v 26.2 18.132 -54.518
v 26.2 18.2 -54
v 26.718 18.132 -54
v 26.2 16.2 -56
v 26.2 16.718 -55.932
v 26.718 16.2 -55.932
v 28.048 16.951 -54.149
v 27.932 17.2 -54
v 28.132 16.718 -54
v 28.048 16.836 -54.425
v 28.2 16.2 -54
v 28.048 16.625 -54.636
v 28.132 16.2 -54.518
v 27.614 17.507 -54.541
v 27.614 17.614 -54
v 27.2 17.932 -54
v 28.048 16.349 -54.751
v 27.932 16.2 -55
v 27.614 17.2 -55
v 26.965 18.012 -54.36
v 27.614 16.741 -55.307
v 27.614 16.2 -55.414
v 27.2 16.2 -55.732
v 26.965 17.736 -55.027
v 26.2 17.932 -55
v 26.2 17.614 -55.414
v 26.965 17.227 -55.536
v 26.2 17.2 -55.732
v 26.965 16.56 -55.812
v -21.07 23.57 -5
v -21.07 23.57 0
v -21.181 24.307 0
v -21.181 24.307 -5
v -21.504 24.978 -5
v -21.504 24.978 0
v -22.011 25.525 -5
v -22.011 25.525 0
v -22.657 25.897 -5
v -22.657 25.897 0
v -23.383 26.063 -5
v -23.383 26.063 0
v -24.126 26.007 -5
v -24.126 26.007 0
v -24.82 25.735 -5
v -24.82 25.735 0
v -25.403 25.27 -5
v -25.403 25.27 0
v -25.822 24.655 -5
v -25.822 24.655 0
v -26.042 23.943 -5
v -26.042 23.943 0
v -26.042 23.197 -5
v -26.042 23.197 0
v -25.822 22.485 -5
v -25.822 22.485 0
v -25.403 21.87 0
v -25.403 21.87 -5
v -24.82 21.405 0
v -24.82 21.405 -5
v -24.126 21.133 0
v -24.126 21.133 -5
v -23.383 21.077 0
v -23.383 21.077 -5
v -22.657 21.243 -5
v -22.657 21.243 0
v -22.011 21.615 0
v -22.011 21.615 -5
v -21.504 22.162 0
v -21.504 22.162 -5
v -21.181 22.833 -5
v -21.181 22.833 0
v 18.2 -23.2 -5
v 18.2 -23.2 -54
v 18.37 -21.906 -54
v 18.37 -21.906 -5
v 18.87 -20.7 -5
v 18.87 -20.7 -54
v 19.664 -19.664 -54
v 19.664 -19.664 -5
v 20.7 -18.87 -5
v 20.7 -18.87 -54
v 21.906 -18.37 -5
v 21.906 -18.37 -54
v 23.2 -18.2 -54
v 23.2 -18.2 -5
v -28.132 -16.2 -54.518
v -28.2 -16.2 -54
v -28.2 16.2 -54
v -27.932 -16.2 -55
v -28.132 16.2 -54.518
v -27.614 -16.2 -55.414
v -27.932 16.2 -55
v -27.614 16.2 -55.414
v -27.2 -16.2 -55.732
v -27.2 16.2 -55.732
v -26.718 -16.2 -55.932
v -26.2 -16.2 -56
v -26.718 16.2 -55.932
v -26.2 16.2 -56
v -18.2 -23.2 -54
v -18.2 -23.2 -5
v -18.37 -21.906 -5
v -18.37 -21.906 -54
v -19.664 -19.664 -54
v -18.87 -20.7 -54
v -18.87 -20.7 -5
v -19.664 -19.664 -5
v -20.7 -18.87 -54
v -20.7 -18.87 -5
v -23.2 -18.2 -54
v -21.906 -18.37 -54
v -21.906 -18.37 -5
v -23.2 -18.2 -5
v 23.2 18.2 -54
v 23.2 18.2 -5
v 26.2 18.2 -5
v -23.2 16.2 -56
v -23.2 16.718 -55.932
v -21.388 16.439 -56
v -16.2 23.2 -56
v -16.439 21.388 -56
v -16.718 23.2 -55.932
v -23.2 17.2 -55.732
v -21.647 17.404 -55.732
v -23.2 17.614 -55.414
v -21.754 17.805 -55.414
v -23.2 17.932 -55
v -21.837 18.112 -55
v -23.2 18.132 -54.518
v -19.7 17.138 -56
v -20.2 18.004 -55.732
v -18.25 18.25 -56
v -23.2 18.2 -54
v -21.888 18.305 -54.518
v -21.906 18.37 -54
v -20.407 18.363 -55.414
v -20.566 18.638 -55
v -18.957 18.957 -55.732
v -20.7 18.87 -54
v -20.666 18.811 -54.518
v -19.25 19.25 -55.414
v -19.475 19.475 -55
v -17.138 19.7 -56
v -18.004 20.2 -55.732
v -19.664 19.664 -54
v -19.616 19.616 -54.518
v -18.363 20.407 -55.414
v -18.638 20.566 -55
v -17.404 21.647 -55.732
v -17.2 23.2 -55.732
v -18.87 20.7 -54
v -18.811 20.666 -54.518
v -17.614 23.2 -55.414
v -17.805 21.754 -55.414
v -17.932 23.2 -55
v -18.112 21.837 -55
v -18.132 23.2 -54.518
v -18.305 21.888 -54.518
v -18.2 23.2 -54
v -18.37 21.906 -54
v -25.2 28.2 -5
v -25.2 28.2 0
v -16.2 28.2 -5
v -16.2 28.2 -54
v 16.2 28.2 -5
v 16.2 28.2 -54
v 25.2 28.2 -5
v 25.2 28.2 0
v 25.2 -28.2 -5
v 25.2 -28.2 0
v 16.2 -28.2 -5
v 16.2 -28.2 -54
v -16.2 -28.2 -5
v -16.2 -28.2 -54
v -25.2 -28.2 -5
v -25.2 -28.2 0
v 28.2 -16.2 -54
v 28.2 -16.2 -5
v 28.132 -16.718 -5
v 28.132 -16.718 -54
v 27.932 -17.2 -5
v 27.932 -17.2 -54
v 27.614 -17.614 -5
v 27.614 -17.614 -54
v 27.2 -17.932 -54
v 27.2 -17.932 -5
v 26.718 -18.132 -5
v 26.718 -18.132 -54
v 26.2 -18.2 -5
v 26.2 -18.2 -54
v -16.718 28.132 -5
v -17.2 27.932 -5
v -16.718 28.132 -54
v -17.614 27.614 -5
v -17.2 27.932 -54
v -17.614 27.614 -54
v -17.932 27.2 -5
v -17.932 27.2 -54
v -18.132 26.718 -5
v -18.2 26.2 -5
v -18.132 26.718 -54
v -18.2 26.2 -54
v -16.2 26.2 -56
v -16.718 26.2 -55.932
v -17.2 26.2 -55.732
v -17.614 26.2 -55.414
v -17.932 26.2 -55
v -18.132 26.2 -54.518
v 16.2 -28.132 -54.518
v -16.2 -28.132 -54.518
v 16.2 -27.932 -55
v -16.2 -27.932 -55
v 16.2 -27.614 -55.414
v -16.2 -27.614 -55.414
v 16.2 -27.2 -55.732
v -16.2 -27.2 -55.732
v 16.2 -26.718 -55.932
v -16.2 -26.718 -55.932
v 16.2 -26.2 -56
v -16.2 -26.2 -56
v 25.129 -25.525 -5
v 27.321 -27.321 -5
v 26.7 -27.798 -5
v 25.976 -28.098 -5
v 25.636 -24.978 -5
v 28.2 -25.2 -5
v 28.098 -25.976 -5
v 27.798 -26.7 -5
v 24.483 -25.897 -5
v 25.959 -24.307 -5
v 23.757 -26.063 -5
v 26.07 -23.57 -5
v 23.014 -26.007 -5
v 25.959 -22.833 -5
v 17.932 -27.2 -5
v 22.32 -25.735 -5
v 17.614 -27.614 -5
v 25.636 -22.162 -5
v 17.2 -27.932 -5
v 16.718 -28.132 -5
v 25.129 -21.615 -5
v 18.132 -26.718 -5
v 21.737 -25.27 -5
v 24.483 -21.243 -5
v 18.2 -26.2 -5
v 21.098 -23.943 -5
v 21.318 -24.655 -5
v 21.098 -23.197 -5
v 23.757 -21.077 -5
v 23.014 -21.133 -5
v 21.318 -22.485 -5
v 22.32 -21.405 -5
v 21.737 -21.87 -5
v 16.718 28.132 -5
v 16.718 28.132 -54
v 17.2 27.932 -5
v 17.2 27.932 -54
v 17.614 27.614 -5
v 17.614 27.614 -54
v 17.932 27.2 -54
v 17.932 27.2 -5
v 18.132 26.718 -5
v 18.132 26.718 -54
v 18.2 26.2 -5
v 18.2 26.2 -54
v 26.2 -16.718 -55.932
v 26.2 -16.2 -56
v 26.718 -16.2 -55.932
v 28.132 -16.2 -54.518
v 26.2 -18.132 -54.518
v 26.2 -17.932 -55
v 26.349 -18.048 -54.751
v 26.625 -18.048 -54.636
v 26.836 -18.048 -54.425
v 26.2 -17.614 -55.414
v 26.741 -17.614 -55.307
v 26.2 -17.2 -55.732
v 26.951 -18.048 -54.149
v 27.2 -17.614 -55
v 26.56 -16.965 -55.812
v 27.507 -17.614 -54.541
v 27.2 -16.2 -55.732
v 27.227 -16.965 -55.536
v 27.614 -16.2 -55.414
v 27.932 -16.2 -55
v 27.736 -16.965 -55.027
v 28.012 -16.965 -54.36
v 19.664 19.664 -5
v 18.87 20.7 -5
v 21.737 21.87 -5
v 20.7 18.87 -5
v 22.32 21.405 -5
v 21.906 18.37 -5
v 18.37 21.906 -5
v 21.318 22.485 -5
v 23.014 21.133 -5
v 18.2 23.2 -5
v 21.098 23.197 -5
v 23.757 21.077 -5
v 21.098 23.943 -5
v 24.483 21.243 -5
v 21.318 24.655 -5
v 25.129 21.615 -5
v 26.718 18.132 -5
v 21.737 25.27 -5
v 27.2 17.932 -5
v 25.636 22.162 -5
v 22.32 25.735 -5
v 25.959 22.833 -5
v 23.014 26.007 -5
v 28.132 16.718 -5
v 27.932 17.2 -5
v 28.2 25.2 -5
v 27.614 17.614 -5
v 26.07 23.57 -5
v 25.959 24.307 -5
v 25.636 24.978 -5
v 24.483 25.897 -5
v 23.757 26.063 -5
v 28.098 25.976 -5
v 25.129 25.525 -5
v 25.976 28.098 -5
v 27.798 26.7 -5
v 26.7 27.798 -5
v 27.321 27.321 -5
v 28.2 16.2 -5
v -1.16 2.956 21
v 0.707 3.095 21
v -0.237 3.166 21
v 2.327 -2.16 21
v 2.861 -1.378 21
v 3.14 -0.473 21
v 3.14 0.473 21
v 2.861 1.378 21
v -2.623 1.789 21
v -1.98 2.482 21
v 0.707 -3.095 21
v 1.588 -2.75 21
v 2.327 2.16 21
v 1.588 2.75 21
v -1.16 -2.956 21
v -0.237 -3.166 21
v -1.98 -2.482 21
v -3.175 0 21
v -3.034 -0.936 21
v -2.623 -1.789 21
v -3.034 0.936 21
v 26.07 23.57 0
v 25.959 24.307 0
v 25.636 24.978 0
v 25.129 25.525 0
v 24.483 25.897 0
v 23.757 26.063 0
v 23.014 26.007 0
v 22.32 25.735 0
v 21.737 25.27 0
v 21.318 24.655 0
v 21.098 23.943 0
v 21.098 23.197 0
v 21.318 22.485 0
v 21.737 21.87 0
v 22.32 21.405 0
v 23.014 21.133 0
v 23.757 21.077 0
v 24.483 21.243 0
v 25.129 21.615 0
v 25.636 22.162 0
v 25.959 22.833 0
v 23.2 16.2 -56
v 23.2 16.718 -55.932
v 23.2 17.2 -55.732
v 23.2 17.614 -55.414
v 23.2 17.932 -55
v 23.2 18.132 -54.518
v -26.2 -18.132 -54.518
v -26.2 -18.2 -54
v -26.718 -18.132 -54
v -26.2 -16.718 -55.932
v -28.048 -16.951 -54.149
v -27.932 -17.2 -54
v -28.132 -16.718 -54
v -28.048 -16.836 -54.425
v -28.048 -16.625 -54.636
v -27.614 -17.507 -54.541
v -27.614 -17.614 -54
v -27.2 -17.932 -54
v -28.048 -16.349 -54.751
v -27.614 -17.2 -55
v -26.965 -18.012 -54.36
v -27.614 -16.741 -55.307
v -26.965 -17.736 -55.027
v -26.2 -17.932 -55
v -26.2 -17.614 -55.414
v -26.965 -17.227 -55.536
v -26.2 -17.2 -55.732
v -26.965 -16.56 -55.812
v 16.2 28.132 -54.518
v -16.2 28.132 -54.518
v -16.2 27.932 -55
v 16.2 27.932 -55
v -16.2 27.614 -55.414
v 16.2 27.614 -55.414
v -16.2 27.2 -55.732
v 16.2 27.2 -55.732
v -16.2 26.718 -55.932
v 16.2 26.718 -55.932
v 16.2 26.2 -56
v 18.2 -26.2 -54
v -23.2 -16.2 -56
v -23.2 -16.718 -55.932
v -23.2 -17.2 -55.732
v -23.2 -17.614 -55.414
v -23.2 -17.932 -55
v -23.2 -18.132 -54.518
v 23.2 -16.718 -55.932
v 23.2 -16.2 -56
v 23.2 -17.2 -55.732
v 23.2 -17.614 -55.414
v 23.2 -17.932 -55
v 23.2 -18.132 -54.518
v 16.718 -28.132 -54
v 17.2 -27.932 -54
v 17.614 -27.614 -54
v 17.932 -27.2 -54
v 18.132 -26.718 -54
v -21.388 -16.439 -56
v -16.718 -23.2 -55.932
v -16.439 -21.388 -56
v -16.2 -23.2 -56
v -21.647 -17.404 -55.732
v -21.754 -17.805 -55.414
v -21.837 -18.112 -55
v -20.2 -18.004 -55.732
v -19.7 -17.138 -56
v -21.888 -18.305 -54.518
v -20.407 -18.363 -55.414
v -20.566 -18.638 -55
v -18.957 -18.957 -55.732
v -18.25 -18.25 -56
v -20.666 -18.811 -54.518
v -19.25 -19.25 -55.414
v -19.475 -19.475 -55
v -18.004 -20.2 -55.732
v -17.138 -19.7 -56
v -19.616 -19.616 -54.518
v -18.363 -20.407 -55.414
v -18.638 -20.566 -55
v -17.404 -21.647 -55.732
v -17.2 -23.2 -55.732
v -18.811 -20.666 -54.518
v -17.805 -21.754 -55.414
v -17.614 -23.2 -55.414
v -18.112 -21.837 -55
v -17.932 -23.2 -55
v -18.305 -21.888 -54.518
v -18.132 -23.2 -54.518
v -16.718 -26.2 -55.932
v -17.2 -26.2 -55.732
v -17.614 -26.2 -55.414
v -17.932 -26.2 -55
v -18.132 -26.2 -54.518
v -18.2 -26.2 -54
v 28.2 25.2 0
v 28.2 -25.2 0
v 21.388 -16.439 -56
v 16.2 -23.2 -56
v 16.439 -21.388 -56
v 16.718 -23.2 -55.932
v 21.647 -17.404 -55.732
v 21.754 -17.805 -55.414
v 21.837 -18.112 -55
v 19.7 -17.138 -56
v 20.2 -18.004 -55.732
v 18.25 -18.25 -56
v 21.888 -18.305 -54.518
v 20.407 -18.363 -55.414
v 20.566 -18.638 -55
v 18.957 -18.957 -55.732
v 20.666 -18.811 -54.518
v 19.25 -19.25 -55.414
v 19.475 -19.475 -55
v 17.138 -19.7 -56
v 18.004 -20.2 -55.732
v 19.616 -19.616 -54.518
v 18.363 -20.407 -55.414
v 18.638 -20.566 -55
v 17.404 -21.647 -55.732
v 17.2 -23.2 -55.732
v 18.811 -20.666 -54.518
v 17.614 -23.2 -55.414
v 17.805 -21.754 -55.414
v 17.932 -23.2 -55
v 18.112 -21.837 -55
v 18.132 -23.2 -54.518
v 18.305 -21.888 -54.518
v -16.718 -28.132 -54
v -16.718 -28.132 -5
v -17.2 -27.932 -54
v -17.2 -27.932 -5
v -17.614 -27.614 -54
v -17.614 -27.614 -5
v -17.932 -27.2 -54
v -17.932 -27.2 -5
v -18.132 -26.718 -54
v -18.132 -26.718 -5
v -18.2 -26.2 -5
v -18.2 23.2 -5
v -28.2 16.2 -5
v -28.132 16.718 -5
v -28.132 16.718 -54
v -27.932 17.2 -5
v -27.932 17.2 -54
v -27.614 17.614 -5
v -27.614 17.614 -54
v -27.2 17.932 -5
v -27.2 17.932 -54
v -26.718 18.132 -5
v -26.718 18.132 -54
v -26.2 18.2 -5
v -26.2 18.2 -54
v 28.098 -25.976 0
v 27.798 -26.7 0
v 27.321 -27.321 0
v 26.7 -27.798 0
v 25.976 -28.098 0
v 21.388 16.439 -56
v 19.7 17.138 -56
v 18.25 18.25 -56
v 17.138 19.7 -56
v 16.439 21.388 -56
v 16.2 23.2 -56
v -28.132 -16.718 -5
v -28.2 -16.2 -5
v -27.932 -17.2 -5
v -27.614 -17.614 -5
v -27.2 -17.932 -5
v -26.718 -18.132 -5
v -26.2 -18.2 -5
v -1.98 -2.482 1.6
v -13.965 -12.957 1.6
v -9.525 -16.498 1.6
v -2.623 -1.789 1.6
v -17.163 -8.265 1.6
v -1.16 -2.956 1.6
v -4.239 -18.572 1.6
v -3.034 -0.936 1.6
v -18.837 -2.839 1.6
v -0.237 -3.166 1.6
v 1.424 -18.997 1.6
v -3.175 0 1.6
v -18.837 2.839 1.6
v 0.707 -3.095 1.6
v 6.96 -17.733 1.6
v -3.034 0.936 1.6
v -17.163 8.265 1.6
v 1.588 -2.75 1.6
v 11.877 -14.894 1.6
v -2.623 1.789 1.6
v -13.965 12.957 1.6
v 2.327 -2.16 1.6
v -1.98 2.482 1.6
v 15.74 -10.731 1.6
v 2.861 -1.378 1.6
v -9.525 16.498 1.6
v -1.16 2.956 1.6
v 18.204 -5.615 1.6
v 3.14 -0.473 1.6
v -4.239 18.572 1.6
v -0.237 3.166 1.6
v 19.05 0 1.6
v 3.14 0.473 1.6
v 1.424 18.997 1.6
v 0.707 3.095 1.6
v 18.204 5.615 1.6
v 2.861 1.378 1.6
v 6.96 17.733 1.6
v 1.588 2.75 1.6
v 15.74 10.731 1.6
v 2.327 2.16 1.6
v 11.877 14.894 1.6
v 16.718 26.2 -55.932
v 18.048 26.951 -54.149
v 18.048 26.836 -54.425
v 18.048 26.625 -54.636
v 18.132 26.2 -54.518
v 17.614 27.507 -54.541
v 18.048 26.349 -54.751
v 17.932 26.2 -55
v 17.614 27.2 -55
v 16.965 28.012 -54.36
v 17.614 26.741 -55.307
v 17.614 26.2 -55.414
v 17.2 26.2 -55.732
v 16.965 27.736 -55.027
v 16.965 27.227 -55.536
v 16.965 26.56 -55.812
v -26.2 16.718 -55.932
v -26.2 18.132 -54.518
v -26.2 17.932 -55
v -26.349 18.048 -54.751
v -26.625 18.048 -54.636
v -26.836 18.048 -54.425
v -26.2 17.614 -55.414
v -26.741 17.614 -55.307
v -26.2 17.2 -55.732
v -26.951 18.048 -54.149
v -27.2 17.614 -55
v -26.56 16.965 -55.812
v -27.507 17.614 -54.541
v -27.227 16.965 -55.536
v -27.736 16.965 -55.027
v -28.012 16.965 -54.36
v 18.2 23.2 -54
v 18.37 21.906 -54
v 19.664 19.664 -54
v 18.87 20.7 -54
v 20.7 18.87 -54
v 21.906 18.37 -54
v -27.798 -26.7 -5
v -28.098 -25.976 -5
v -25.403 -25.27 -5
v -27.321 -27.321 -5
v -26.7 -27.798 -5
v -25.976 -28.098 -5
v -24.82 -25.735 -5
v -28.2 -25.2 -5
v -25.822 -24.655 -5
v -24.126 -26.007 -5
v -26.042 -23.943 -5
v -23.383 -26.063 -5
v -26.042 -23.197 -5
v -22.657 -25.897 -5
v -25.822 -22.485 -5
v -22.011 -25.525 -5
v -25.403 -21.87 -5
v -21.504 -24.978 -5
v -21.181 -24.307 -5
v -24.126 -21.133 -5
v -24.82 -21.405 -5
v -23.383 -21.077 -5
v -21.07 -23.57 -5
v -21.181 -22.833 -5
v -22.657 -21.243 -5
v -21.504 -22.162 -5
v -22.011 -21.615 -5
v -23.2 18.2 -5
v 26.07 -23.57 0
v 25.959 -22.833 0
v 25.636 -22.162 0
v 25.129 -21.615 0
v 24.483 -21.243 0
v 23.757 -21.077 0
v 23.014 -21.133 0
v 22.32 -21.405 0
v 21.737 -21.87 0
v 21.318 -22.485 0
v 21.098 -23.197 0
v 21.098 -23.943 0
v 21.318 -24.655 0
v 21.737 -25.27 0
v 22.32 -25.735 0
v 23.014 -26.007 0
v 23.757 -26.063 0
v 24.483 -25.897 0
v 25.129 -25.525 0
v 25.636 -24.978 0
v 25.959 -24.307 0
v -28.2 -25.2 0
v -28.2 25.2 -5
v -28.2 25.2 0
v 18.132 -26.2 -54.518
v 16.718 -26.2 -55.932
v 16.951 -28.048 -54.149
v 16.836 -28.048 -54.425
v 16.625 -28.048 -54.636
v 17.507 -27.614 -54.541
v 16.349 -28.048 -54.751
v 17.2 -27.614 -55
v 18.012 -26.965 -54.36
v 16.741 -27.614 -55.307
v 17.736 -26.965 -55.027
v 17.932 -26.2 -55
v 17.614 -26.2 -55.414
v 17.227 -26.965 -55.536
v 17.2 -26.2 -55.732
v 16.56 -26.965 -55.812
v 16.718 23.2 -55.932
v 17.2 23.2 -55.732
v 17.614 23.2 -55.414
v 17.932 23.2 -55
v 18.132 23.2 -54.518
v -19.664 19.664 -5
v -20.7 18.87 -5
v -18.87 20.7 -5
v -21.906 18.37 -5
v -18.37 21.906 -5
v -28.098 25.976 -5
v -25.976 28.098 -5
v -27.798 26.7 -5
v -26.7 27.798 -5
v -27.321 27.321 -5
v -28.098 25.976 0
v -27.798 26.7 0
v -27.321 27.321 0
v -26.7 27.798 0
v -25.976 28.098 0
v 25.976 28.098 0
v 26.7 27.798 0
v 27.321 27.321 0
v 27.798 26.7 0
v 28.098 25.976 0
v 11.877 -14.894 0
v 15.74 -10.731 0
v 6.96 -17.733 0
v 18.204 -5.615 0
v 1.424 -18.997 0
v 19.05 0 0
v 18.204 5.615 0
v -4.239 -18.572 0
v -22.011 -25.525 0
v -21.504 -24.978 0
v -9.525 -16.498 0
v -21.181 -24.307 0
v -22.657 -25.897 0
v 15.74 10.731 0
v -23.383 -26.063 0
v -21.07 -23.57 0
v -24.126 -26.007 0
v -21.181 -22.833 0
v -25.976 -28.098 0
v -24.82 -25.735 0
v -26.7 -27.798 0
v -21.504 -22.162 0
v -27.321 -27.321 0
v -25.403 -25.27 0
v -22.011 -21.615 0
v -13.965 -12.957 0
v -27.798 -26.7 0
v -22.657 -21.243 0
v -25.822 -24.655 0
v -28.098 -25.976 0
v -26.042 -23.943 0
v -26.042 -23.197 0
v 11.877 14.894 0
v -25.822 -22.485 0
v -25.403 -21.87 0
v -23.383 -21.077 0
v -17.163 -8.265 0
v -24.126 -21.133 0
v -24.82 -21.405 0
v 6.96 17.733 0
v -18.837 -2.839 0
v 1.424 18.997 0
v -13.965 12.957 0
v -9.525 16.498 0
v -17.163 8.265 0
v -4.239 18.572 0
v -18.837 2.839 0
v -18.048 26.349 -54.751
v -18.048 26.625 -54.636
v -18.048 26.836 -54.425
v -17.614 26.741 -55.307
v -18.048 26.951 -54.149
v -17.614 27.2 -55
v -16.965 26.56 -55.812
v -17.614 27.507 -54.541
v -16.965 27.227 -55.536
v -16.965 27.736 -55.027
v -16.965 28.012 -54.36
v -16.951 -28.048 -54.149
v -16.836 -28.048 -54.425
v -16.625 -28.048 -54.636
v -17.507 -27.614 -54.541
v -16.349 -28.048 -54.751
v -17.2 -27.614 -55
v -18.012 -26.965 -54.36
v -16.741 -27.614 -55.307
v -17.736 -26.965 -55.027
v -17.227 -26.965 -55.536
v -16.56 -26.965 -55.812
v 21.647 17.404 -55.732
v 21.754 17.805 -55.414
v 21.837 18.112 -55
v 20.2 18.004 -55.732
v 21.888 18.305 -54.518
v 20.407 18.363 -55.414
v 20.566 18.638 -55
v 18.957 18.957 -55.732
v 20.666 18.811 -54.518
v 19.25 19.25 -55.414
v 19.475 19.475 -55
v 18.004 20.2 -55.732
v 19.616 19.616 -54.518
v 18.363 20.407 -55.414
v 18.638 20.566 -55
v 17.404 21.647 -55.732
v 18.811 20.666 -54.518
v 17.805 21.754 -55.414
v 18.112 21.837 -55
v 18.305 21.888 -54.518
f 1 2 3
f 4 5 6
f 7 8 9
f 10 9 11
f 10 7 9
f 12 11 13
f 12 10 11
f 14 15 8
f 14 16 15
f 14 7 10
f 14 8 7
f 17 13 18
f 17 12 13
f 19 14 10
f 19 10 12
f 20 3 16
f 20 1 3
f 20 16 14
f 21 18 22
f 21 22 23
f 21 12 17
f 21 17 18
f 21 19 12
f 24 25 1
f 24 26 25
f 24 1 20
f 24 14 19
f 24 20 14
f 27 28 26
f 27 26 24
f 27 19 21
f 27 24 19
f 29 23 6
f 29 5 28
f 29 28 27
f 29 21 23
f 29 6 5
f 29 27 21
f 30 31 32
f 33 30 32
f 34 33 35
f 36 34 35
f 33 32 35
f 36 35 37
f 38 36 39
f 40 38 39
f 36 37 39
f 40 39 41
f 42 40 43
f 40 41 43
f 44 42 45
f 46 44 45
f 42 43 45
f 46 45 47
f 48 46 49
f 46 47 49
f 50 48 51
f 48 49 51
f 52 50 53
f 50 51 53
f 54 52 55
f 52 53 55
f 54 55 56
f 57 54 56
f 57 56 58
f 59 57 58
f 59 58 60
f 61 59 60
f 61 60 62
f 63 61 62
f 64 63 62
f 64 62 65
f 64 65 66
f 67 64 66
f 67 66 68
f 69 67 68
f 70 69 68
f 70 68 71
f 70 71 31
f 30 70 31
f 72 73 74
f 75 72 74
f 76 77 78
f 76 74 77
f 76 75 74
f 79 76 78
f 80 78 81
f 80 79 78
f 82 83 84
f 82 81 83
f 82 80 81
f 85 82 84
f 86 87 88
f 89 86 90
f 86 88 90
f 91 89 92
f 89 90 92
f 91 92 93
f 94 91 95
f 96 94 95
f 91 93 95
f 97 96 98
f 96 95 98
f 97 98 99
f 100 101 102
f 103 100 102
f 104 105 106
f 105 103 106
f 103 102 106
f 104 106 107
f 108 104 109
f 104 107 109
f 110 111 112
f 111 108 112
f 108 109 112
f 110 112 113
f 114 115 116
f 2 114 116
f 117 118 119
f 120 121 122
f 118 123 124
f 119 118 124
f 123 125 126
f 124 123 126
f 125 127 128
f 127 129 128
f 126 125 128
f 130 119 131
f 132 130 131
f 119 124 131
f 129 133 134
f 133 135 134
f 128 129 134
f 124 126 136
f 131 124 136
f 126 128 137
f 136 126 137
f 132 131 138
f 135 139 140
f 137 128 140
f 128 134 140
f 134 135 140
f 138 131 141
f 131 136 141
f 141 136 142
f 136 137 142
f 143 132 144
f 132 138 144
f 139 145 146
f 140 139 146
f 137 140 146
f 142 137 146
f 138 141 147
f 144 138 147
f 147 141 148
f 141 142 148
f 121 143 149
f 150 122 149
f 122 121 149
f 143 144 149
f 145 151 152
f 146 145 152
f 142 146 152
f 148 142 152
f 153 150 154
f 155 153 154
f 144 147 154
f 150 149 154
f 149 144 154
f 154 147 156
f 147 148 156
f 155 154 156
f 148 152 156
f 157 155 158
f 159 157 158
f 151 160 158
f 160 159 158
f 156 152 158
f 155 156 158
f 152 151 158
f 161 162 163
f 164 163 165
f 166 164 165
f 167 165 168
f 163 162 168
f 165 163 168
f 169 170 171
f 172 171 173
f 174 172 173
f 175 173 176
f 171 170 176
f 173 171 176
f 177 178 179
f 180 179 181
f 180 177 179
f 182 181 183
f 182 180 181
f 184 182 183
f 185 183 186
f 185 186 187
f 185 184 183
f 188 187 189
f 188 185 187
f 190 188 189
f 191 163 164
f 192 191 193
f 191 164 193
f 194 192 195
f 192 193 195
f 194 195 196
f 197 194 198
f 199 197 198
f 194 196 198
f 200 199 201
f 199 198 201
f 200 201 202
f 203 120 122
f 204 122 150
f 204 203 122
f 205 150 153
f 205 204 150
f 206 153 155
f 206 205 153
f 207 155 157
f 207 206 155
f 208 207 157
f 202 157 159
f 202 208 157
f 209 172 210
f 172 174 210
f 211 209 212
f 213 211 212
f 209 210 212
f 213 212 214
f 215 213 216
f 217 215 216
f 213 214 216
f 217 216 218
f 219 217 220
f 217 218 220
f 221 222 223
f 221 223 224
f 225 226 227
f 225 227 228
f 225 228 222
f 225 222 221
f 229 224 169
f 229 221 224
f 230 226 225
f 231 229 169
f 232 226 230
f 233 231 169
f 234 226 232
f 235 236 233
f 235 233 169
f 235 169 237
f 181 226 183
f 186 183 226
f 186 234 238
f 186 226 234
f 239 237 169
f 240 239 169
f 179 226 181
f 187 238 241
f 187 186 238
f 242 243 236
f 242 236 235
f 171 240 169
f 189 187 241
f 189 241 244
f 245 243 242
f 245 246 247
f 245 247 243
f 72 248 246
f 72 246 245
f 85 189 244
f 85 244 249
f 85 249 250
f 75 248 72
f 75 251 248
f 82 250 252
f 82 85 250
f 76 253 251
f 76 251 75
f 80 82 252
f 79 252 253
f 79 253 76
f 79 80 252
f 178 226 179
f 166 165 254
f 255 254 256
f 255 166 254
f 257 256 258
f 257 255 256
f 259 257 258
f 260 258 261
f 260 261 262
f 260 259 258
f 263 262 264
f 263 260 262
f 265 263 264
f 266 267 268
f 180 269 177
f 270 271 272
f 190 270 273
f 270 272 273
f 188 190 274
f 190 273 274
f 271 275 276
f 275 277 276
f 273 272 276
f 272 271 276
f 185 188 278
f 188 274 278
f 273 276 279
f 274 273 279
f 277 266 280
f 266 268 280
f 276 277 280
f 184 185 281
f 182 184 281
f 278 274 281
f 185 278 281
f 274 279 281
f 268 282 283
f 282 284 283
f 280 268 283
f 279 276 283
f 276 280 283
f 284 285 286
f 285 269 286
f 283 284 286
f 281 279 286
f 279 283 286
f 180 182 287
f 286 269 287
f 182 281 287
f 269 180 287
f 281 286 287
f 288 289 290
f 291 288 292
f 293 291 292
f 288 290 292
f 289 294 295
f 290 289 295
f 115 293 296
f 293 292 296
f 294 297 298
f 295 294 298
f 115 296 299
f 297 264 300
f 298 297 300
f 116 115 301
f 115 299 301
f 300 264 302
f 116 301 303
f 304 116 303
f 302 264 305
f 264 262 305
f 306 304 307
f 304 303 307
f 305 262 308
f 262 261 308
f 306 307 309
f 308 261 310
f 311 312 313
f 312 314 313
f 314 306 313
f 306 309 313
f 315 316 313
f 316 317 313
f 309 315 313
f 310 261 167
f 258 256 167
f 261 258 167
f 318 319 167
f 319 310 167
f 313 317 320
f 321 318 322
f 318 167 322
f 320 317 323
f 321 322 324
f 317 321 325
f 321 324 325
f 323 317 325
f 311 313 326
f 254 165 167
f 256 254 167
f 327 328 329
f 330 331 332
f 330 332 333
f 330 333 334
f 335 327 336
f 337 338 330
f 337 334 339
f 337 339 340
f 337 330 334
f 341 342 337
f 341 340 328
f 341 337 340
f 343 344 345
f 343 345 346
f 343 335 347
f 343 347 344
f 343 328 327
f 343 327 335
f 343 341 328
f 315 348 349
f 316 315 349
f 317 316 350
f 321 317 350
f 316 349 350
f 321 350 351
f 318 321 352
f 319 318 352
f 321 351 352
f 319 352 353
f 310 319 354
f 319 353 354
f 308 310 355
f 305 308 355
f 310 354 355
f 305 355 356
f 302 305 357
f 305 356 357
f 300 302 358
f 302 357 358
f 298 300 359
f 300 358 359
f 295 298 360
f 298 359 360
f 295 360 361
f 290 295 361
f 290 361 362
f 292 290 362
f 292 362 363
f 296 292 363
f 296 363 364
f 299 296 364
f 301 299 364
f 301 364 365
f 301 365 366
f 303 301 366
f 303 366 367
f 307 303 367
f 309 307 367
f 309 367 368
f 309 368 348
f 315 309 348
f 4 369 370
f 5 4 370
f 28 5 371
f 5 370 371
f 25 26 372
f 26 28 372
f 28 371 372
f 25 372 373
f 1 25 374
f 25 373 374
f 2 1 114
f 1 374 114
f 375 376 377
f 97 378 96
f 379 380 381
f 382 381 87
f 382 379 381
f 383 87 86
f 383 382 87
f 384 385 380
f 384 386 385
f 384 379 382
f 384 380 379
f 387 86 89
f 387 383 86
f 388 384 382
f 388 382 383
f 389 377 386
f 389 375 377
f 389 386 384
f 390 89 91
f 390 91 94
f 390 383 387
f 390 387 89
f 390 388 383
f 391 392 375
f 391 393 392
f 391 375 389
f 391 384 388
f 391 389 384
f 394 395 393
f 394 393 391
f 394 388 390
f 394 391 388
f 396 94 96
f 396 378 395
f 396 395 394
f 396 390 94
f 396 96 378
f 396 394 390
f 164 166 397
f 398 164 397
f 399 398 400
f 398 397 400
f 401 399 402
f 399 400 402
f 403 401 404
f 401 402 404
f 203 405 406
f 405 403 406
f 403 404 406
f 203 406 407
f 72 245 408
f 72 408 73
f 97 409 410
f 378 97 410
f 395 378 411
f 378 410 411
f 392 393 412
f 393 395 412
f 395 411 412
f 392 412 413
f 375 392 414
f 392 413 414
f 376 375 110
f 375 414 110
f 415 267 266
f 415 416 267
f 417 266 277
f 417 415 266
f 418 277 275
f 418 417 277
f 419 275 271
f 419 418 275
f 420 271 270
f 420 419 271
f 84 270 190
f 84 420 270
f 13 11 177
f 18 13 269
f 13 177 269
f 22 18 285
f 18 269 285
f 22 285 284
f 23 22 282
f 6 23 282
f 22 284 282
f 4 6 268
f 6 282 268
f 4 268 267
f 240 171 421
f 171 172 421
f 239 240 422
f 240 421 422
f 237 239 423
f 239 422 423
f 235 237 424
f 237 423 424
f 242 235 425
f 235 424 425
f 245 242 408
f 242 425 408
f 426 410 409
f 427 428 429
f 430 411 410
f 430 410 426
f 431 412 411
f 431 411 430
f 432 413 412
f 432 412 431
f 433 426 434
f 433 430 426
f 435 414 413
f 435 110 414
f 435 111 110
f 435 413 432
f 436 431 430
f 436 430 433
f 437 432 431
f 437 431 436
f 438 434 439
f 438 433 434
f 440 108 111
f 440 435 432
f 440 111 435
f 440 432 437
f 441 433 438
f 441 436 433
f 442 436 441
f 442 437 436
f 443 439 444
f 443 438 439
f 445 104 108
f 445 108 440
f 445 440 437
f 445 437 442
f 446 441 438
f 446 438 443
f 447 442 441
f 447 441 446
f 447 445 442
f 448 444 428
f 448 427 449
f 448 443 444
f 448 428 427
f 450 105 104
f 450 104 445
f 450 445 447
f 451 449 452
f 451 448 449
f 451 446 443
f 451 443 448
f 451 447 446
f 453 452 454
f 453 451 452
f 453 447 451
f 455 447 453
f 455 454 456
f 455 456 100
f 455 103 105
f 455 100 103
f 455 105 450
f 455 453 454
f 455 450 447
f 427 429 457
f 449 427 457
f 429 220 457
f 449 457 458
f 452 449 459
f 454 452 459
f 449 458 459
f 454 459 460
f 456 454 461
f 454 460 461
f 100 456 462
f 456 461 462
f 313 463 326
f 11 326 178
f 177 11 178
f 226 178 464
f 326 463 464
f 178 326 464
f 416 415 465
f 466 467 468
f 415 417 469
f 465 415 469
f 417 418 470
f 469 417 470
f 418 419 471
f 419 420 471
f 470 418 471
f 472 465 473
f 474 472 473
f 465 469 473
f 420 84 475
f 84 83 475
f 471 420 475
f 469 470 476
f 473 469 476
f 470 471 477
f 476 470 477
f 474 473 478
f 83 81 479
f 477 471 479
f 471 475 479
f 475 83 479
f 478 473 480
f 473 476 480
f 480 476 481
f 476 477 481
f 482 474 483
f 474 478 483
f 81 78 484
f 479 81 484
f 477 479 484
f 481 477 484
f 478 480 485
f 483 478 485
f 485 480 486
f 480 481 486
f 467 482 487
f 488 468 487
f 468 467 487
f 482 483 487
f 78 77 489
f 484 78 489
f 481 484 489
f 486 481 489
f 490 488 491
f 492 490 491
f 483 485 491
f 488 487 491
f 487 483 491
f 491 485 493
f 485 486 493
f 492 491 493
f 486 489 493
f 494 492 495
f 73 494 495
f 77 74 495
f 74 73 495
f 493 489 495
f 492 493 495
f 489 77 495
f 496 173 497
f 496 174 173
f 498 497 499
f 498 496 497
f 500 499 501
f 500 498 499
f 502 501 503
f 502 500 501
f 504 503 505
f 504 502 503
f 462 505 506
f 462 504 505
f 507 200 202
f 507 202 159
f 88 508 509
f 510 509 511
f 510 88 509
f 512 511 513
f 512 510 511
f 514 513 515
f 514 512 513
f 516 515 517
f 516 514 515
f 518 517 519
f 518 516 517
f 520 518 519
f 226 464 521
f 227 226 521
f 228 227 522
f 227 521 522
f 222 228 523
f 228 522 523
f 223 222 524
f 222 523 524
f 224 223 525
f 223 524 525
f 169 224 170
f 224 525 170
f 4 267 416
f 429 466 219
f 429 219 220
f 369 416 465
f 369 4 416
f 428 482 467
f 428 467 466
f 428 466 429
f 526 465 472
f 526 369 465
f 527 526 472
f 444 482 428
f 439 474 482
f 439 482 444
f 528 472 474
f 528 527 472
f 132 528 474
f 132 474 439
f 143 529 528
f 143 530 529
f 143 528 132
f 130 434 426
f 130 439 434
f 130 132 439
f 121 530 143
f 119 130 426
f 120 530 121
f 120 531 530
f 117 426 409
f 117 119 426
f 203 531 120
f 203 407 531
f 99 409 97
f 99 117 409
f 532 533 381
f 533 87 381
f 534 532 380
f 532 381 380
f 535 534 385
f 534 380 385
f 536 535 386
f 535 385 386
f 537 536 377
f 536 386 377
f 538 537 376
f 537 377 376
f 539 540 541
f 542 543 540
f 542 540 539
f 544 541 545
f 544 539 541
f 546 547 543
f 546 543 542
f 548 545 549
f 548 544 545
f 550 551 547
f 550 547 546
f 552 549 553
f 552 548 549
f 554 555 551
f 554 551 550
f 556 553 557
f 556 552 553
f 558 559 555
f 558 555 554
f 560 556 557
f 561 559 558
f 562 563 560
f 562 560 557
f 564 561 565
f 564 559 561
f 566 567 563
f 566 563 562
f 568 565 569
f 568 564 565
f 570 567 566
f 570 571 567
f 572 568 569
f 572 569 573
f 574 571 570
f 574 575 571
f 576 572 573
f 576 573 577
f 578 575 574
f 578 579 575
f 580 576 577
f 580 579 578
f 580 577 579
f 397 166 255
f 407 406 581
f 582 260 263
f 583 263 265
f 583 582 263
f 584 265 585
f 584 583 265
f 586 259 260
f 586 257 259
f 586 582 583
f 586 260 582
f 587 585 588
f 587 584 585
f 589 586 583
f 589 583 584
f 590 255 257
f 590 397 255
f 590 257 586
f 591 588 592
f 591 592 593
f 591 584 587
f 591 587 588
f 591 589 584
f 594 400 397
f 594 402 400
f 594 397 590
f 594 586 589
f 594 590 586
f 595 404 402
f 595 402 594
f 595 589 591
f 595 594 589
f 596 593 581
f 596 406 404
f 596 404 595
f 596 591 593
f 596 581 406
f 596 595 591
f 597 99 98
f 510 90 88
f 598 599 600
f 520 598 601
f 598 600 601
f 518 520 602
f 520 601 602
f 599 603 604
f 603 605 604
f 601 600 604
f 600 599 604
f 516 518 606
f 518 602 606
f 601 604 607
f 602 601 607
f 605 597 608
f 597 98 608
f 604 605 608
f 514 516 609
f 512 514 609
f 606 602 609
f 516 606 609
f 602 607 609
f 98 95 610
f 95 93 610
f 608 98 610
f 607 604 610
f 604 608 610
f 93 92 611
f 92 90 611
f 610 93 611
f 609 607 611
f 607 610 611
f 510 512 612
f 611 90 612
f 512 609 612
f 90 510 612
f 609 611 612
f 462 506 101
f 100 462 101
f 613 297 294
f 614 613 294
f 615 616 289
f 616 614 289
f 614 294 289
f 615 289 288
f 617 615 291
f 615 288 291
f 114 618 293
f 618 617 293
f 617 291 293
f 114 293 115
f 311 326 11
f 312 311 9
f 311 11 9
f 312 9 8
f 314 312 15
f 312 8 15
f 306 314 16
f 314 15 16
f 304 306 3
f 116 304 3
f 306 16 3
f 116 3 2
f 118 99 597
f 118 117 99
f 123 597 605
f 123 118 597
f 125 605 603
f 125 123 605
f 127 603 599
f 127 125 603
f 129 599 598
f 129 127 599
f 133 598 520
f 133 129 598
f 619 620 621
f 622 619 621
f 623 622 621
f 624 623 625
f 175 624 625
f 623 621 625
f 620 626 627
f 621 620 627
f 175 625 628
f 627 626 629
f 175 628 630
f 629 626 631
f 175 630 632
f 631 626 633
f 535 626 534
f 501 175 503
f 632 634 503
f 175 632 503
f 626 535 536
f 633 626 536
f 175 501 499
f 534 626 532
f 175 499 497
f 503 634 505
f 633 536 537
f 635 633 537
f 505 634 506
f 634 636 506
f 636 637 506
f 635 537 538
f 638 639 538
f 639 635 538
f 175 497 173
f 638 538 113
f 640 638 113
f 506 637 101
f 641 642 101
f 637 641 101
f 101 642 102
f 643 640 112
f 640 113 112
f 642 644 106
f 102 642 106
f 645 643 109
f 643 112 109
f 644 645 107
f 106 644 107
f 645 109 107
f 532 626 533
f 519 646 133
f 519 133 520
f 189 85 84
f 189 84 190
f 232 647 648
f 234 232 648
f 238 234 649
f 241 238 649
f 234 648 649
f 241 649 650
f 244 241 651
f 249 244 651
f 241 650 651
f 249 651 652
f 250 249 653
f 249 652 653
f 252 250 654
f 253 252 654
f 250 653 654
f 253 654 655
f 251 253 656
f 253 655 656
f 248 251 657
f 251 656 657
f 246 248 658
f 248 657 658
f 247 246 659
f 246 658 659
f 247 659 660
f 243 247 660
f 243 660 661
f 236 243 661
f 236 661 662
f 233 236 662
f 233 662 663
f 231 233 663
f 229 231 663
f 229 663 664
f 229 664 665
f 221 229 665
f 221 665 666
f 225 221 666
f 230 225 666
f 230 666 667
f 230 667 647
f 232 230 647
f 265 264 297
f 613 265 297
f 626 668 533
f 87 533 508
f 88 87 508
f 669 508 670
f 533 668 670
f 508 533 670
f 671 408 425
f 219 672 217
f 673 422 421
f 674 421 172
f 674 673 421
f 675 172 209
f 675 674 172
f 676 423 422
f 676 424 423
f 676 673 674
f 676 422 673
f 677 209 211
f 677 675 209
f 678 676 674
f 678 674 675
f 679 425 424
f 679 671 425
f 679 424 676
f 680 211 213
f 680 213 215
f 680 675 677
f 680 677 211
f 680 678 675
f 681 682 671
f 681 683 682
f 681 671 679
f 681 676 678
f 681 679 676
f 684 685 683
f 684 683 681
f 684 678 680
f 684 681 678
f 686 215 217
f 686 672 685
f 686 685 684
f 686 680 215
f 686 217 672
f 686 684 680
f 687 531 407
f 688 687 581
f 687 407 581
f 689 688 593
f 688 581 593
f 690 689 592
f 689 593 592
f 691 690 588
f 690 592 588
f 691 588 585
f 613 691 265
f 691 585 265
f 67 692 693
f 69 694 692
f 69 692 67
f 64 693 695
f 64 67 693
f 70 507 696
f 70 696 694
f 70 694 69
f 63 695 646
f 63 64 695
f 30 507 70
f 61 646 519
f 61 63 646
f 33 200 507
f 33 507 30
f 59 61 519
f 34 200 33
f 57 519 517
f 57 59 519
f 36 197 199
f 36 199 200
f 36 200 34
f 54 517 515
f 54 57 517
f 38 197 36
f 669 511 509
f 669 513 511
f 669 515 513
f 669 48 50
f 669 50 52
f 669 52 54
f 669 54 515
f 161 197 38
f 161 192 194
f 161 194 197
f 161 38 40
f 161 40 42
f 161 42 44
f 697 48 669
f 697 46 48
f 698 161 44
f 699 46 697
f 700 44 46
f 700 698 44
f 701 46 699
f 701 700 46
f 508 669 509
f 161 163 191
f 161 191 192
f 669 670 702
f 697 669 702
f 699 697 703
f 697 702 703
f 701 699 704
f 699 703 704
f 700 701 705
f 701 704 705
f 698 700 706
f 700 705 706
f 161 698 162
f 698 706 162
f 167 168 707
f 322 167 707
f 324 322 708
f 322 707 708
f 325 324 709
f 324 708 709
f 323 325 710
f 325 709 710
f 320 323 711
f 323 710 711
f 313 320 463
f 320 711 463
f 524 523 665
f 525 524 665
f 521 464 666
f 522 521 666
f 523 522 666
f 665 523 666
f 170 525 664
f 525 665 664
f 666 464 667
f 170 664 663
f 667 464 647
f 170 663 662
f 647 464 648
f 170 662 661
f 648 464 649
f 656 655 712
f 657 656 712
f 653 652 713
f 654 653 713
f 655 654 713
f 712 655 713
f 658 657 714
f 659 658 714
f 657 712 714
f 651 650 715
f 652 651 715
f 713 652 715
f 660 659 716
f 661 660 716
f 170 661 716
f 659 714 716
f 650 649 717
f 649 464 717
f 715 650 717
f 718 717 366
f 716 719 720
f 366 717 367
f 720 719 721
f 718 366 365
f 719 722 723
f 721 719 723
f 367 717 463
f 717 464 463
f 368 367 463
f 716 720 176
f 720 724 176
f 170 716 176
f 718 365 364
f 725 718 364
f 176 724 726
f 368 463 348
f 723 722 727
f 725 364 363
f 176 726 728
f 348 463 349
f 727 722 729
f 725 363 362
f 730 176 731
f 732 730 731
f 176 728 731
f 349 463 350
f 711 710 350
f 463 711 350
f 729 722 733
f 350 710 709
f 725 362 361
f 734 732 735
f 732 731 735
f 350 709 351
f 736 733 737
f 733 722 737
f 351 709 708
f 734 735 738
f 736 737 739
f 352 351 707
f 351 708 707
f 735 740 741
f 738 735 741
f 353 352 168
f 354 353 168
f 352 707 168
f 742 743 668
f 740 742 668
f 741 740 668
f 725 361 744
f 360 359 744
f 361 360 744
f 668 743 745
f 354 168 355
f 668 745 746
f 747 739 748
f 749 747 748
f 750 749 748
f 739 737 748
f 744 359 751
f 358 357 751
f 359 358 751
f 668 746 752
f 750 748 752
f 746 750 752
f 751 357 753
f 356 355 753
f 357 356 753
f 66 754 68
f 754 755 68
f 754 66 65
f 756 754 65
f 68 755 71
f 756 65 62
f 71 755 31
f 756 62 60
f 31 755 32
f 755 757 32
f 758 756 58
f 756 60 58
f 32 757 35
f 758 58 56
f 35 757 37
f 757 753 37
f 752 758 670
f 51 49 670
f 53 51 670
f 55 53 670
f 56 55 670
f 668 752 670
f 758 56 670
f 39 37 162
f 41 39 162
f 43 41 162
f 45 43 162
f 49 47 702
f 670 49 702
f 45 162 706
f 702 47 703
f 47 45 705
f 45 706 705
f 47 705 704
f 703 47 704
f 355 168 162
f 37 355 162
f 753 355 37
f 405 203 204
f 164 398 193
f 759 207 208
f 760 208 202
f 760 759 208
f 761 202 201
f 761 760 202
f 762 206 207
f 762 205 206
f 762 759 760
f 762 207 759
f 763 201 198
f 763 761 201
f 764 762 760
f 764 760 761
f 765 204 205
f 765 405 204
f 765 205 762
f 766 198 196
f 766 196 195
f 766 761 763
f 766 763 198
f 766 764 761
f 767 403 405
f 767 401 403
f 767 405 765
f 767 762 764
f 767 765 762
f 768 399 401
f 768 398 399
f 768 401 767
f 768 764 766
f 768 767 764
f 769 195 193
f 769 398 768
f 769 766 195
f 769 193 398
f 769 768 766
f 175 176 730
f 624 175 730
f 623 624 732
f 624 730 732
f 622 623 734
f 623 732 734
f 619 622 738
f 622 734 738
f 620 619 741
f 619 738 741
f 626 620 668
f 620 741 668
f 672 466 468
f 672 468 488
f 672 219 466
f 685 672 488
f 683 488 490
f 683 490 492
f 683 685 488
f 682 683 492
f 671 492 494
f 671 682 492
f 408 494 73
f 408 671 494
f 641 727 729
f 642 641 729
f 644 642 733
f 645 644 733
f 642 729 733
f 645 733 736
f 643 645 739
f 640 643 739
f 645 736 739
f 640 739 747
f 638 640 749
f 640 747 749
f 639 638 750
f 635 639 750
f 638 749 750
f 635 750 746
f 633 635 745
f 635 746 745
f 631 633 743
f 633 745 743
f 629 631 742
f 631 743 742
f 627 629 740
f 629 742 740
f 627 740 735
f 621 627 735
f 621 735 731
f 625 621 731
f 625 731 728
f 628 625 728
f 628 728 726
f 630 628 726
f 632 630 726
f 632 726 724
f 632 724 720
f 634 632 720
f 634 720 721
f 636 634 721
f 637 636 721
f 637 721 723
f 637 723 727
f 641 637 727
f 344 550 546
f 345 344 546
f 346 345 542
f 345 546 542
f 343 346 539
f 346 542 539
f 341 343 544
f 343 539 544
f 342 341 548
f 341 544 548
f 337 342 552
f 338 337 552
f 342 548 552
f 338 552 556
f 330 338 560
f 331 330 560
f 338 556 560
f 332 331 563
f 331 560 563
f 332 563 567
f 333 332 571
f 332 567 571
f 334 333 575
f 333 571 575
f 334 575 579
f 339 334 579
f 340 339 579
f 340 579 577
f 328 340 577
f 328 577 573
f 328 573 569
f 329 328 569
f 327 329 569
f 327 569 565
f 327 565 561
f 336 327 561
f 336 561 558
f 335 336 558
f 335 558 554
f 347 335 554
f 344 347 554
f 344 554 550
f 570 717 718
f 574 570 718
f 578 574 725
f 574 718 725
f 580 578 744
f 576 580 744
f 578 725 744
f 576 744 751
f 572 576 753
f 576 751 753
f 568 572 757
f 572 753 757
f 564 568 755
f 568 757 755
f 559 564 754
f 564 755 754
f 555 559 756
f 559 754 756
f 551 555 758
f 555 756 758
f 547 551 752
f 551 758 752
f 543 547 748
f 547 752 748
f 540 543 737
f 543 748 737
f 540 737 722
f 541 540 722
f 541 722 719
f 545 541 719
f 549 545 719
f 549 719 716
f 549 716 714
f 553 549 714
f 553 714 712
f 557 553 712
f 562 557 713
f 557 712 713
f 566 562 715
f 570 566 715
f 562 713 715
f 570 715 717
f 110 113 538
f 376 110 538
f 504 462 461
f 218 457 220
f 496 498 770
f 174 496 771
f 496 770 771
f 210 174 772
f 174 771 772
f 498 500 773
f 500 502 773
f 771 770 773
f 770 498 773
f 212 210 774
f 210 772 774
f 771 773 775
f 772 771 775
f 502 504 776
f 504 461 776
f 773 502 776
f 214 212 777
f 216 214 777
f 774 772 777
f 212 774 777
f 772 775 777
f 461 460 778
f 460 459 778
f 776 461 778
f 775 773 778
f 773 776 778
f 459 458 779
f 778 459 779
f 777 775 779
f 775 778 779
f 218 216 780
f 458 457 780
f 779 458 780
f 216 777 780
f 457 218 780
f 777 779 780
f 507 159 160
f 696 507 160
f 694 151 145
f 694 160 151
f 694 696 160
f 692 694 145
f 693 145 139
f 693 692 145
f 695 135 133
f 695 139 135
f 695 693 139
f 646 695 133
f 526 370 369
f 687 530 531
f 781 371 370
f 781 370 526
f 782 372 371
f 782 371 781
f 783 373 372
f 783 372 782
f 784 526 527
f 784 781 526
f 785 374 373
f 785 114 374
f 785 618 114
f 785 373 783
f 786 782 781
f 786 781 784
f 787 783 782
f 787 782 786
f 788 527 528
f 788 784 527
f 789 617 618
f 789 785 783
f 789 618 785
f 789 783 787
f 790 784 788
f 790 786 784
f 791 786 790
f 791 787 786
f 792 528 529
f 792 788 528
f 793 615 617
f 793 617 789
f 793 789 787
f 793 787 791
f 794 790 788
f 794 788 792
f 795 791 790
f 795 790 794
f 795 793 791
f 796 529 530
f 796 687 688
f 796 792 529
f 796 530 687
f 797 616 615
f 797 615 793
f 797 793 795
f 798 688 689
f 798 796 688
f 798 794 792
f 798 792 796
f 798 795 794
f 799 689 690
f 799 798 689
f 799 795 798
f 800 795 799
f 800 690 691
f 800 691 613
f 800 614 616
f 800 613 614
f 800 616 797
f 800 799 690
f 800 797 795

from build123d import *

# Parameters (mm, degrees)
SKETCH1_R           = 2.5
BOSS_EXTRUDE2_DEPTH = 56
CUT_EXTRUDE1_DEPTH  = 65.741640387
SKETCH3_R           = 19.05
BOSS_EXTRUDE3_DEPTH = 1.6
SKETCH4_R           = 3.175
BOSS_EXTRUDE4_DEPTH = 21
FILLET1_R           = 2


with BuildPart() as part:
    # Sketch1 → Boss-Extrude2 (new body)
    with BuildSketch(Plane.XY):
        with BuildLine():
            Line((-25.2, 28.2), (25.2, 28.2))
            ThreePointArc((25.2, 28.2), (27.321320344, 27.321320344), (28.2, 25.2))
            Line((28.2, 25.2), (28.2, -25.2))
            ThreePointArc((28.2, -25.2), (27.321320344, -27.321320344), (25.2, -28.2))
            Line((25.2, -28.2), (-25.2, -28.2))
            ThreePointArc((-25.2, -28.2), (-27.321320344, -27.321320344), (-28.2, -25.2))
            Line((-28.2, -25.2), (-28.2, 25.2))
            ThreePointArc((-28.2, 25.2), (-27.321320344, 27.321320344), (-25.2, 28.2))
        make_face()
        with Locations((23.57, 23.57)):
            Circle(SKETCH1_R, mode=Mode.SUBTRACT)
        with Locations((-23.57, 23.57)):
            Circle(SKETCH1_R, mode=Mode.SUBTRACT)
        with Locations((-23.57, -23.57)):
            Circle(SKETCH1_R, mode=Mode.SUBTRACT)
        with Locations((23.57, -23.57)):
            Circle(SKETCH1_R, mode=Mode.SUBTRACT)
    extrude(amount=-BOSS_EXTRUDE2_DEPTH)

    # Sketch2 → Cut-Extrude1 (cut, through all)
    with BuildSketch(Plane.XY.offset(-5)):
        with BuildLine():
            Line((18.2, 28.2), (18.2, 23.2))
            ThreePointArc((18.2, 23.2), (19.664466094, 19.664466094), (23.2, 18.2))
            Line((23.2, 18.2), (28.2, 18.2))
            Line((28.2, 18.2), (28.2, 25.2))
            ThreePointArc((28.2, 25.2), (27.321320344, 27.321320344), (25.2, 28.2))
            Line((25.2, 28.2), (18.2, 28.2))
        make_face()
        with BuildLine():
            Line((-28.2, 18.2), (-28.2, 25.2))
            ThreePointArc((-28.2, 25.2), (-27.321320344, 27.321320344), (-25.2, 28.2))
            Line((-25.2, 28.2), (-18.2, 28.2))
            Line((-18.2, 28.2), (-18.2, 23.2))
            ThreePointArc((-18.2, 23.2), (-19.664466094, 19.664466094), (-23.2, 18.2))
            Line((-23.2, 18.2), (-28.2, 18.2))
        make_face()
        with BuildLine():
            Line((-18.2, -28.2), (-18.2, -23.2))
            ThreePointArc((-18.2, -23.2), (-19.664466094, -19.664466094), (-23.2, -18.2))
            Line((-23.2, -18.2), (-28.2, -18.2))
            Line((-28.2, -18.2), (-28.2, -25.2))
            ThreePointArc((-28.2, -25.2), (-27.321320344, -27.321320344), (-25.2, -28.2))
            Line((-25.2, -28.2), (-18.2, -28.2))
        make_face()
        with BuildLine():
            Line((28.2, -18.2), (28.2, -25.2))
            ThreePointArc((28.2, -25.2), (27.321320344, -27.321320344), (25.2, -28.2))
            Line((25.2, -28.2), (18.2, -28.2))
            Line((18.2, -28.2), (18.2, -23.2))
            ThreePointArc((18.2, -23.2), (19.664466094, -19.664466094), (23.2, -18.2))
            Line((23.2, -18.2), (28.2, -18.2))
        make_face()
    extrude(amount=-CUT_EXTRUDE1_DEPTH, mode=Mode.SUBTRACT)

    # Sketch3 → Boss-Extrude3 (add)
    with BuildSketch(Plane.XY):
        Circle(SKETCH3_R)
    extrude(amount=BOSS_EXTRUDE3_DEPTH)

    # Sketch4 → Boss-Extrude4 (add)
    with BuildSketch(Plane.XY):
        with Locations(Location((0, 0, 0), (0, 0, 180))):
            Circle(SKETCH4_R)
    extrude(amount=BOSS_EXTRUDE4_DEPTH)

    # Fillet1
    fillet1_edges = [part.edges().sort_by_distance(p)[0] for p in [
        (-25.7, -18.2, -56),
        (-28.2, -18.2, -30.5),
        (-19.664466094, -19.664466094, -56),
        (-18.2, -25.7, -56),
        (-18.2, -28.2, -30.5),
        (0, 28.2, -56),
        (18.2, 28.2, -30.5),
        (25.7, 18.2, -56),
        (28.2, 18.2, -30.5),
        (19.664466094, 19.664466094, -56),
        (18.2, 25.7, -56),
        (-28.2, 0, -56),
        (-18.2, 25.7, -56),
        (-18.2, 28.2, -30.5),
        (-19.664466094, 19.664466094, -56),
        (-25.7, 18.2, -56),
        (-28.2, 18.2, -30.5),
        (28.2, 0, -56),
        (18.2, -25.7, -56),
        (18.2, -28.2, -30.5),
        (19.664466094, -19.664466094, -56),
        (25.7, -18.2, -56),
        (28.2, -18.2, -30.5),
        (0, -28.2, -56),
    ]]
    fillet(fillet1_edges, radius=FILLET1_R)


solid = part.part
